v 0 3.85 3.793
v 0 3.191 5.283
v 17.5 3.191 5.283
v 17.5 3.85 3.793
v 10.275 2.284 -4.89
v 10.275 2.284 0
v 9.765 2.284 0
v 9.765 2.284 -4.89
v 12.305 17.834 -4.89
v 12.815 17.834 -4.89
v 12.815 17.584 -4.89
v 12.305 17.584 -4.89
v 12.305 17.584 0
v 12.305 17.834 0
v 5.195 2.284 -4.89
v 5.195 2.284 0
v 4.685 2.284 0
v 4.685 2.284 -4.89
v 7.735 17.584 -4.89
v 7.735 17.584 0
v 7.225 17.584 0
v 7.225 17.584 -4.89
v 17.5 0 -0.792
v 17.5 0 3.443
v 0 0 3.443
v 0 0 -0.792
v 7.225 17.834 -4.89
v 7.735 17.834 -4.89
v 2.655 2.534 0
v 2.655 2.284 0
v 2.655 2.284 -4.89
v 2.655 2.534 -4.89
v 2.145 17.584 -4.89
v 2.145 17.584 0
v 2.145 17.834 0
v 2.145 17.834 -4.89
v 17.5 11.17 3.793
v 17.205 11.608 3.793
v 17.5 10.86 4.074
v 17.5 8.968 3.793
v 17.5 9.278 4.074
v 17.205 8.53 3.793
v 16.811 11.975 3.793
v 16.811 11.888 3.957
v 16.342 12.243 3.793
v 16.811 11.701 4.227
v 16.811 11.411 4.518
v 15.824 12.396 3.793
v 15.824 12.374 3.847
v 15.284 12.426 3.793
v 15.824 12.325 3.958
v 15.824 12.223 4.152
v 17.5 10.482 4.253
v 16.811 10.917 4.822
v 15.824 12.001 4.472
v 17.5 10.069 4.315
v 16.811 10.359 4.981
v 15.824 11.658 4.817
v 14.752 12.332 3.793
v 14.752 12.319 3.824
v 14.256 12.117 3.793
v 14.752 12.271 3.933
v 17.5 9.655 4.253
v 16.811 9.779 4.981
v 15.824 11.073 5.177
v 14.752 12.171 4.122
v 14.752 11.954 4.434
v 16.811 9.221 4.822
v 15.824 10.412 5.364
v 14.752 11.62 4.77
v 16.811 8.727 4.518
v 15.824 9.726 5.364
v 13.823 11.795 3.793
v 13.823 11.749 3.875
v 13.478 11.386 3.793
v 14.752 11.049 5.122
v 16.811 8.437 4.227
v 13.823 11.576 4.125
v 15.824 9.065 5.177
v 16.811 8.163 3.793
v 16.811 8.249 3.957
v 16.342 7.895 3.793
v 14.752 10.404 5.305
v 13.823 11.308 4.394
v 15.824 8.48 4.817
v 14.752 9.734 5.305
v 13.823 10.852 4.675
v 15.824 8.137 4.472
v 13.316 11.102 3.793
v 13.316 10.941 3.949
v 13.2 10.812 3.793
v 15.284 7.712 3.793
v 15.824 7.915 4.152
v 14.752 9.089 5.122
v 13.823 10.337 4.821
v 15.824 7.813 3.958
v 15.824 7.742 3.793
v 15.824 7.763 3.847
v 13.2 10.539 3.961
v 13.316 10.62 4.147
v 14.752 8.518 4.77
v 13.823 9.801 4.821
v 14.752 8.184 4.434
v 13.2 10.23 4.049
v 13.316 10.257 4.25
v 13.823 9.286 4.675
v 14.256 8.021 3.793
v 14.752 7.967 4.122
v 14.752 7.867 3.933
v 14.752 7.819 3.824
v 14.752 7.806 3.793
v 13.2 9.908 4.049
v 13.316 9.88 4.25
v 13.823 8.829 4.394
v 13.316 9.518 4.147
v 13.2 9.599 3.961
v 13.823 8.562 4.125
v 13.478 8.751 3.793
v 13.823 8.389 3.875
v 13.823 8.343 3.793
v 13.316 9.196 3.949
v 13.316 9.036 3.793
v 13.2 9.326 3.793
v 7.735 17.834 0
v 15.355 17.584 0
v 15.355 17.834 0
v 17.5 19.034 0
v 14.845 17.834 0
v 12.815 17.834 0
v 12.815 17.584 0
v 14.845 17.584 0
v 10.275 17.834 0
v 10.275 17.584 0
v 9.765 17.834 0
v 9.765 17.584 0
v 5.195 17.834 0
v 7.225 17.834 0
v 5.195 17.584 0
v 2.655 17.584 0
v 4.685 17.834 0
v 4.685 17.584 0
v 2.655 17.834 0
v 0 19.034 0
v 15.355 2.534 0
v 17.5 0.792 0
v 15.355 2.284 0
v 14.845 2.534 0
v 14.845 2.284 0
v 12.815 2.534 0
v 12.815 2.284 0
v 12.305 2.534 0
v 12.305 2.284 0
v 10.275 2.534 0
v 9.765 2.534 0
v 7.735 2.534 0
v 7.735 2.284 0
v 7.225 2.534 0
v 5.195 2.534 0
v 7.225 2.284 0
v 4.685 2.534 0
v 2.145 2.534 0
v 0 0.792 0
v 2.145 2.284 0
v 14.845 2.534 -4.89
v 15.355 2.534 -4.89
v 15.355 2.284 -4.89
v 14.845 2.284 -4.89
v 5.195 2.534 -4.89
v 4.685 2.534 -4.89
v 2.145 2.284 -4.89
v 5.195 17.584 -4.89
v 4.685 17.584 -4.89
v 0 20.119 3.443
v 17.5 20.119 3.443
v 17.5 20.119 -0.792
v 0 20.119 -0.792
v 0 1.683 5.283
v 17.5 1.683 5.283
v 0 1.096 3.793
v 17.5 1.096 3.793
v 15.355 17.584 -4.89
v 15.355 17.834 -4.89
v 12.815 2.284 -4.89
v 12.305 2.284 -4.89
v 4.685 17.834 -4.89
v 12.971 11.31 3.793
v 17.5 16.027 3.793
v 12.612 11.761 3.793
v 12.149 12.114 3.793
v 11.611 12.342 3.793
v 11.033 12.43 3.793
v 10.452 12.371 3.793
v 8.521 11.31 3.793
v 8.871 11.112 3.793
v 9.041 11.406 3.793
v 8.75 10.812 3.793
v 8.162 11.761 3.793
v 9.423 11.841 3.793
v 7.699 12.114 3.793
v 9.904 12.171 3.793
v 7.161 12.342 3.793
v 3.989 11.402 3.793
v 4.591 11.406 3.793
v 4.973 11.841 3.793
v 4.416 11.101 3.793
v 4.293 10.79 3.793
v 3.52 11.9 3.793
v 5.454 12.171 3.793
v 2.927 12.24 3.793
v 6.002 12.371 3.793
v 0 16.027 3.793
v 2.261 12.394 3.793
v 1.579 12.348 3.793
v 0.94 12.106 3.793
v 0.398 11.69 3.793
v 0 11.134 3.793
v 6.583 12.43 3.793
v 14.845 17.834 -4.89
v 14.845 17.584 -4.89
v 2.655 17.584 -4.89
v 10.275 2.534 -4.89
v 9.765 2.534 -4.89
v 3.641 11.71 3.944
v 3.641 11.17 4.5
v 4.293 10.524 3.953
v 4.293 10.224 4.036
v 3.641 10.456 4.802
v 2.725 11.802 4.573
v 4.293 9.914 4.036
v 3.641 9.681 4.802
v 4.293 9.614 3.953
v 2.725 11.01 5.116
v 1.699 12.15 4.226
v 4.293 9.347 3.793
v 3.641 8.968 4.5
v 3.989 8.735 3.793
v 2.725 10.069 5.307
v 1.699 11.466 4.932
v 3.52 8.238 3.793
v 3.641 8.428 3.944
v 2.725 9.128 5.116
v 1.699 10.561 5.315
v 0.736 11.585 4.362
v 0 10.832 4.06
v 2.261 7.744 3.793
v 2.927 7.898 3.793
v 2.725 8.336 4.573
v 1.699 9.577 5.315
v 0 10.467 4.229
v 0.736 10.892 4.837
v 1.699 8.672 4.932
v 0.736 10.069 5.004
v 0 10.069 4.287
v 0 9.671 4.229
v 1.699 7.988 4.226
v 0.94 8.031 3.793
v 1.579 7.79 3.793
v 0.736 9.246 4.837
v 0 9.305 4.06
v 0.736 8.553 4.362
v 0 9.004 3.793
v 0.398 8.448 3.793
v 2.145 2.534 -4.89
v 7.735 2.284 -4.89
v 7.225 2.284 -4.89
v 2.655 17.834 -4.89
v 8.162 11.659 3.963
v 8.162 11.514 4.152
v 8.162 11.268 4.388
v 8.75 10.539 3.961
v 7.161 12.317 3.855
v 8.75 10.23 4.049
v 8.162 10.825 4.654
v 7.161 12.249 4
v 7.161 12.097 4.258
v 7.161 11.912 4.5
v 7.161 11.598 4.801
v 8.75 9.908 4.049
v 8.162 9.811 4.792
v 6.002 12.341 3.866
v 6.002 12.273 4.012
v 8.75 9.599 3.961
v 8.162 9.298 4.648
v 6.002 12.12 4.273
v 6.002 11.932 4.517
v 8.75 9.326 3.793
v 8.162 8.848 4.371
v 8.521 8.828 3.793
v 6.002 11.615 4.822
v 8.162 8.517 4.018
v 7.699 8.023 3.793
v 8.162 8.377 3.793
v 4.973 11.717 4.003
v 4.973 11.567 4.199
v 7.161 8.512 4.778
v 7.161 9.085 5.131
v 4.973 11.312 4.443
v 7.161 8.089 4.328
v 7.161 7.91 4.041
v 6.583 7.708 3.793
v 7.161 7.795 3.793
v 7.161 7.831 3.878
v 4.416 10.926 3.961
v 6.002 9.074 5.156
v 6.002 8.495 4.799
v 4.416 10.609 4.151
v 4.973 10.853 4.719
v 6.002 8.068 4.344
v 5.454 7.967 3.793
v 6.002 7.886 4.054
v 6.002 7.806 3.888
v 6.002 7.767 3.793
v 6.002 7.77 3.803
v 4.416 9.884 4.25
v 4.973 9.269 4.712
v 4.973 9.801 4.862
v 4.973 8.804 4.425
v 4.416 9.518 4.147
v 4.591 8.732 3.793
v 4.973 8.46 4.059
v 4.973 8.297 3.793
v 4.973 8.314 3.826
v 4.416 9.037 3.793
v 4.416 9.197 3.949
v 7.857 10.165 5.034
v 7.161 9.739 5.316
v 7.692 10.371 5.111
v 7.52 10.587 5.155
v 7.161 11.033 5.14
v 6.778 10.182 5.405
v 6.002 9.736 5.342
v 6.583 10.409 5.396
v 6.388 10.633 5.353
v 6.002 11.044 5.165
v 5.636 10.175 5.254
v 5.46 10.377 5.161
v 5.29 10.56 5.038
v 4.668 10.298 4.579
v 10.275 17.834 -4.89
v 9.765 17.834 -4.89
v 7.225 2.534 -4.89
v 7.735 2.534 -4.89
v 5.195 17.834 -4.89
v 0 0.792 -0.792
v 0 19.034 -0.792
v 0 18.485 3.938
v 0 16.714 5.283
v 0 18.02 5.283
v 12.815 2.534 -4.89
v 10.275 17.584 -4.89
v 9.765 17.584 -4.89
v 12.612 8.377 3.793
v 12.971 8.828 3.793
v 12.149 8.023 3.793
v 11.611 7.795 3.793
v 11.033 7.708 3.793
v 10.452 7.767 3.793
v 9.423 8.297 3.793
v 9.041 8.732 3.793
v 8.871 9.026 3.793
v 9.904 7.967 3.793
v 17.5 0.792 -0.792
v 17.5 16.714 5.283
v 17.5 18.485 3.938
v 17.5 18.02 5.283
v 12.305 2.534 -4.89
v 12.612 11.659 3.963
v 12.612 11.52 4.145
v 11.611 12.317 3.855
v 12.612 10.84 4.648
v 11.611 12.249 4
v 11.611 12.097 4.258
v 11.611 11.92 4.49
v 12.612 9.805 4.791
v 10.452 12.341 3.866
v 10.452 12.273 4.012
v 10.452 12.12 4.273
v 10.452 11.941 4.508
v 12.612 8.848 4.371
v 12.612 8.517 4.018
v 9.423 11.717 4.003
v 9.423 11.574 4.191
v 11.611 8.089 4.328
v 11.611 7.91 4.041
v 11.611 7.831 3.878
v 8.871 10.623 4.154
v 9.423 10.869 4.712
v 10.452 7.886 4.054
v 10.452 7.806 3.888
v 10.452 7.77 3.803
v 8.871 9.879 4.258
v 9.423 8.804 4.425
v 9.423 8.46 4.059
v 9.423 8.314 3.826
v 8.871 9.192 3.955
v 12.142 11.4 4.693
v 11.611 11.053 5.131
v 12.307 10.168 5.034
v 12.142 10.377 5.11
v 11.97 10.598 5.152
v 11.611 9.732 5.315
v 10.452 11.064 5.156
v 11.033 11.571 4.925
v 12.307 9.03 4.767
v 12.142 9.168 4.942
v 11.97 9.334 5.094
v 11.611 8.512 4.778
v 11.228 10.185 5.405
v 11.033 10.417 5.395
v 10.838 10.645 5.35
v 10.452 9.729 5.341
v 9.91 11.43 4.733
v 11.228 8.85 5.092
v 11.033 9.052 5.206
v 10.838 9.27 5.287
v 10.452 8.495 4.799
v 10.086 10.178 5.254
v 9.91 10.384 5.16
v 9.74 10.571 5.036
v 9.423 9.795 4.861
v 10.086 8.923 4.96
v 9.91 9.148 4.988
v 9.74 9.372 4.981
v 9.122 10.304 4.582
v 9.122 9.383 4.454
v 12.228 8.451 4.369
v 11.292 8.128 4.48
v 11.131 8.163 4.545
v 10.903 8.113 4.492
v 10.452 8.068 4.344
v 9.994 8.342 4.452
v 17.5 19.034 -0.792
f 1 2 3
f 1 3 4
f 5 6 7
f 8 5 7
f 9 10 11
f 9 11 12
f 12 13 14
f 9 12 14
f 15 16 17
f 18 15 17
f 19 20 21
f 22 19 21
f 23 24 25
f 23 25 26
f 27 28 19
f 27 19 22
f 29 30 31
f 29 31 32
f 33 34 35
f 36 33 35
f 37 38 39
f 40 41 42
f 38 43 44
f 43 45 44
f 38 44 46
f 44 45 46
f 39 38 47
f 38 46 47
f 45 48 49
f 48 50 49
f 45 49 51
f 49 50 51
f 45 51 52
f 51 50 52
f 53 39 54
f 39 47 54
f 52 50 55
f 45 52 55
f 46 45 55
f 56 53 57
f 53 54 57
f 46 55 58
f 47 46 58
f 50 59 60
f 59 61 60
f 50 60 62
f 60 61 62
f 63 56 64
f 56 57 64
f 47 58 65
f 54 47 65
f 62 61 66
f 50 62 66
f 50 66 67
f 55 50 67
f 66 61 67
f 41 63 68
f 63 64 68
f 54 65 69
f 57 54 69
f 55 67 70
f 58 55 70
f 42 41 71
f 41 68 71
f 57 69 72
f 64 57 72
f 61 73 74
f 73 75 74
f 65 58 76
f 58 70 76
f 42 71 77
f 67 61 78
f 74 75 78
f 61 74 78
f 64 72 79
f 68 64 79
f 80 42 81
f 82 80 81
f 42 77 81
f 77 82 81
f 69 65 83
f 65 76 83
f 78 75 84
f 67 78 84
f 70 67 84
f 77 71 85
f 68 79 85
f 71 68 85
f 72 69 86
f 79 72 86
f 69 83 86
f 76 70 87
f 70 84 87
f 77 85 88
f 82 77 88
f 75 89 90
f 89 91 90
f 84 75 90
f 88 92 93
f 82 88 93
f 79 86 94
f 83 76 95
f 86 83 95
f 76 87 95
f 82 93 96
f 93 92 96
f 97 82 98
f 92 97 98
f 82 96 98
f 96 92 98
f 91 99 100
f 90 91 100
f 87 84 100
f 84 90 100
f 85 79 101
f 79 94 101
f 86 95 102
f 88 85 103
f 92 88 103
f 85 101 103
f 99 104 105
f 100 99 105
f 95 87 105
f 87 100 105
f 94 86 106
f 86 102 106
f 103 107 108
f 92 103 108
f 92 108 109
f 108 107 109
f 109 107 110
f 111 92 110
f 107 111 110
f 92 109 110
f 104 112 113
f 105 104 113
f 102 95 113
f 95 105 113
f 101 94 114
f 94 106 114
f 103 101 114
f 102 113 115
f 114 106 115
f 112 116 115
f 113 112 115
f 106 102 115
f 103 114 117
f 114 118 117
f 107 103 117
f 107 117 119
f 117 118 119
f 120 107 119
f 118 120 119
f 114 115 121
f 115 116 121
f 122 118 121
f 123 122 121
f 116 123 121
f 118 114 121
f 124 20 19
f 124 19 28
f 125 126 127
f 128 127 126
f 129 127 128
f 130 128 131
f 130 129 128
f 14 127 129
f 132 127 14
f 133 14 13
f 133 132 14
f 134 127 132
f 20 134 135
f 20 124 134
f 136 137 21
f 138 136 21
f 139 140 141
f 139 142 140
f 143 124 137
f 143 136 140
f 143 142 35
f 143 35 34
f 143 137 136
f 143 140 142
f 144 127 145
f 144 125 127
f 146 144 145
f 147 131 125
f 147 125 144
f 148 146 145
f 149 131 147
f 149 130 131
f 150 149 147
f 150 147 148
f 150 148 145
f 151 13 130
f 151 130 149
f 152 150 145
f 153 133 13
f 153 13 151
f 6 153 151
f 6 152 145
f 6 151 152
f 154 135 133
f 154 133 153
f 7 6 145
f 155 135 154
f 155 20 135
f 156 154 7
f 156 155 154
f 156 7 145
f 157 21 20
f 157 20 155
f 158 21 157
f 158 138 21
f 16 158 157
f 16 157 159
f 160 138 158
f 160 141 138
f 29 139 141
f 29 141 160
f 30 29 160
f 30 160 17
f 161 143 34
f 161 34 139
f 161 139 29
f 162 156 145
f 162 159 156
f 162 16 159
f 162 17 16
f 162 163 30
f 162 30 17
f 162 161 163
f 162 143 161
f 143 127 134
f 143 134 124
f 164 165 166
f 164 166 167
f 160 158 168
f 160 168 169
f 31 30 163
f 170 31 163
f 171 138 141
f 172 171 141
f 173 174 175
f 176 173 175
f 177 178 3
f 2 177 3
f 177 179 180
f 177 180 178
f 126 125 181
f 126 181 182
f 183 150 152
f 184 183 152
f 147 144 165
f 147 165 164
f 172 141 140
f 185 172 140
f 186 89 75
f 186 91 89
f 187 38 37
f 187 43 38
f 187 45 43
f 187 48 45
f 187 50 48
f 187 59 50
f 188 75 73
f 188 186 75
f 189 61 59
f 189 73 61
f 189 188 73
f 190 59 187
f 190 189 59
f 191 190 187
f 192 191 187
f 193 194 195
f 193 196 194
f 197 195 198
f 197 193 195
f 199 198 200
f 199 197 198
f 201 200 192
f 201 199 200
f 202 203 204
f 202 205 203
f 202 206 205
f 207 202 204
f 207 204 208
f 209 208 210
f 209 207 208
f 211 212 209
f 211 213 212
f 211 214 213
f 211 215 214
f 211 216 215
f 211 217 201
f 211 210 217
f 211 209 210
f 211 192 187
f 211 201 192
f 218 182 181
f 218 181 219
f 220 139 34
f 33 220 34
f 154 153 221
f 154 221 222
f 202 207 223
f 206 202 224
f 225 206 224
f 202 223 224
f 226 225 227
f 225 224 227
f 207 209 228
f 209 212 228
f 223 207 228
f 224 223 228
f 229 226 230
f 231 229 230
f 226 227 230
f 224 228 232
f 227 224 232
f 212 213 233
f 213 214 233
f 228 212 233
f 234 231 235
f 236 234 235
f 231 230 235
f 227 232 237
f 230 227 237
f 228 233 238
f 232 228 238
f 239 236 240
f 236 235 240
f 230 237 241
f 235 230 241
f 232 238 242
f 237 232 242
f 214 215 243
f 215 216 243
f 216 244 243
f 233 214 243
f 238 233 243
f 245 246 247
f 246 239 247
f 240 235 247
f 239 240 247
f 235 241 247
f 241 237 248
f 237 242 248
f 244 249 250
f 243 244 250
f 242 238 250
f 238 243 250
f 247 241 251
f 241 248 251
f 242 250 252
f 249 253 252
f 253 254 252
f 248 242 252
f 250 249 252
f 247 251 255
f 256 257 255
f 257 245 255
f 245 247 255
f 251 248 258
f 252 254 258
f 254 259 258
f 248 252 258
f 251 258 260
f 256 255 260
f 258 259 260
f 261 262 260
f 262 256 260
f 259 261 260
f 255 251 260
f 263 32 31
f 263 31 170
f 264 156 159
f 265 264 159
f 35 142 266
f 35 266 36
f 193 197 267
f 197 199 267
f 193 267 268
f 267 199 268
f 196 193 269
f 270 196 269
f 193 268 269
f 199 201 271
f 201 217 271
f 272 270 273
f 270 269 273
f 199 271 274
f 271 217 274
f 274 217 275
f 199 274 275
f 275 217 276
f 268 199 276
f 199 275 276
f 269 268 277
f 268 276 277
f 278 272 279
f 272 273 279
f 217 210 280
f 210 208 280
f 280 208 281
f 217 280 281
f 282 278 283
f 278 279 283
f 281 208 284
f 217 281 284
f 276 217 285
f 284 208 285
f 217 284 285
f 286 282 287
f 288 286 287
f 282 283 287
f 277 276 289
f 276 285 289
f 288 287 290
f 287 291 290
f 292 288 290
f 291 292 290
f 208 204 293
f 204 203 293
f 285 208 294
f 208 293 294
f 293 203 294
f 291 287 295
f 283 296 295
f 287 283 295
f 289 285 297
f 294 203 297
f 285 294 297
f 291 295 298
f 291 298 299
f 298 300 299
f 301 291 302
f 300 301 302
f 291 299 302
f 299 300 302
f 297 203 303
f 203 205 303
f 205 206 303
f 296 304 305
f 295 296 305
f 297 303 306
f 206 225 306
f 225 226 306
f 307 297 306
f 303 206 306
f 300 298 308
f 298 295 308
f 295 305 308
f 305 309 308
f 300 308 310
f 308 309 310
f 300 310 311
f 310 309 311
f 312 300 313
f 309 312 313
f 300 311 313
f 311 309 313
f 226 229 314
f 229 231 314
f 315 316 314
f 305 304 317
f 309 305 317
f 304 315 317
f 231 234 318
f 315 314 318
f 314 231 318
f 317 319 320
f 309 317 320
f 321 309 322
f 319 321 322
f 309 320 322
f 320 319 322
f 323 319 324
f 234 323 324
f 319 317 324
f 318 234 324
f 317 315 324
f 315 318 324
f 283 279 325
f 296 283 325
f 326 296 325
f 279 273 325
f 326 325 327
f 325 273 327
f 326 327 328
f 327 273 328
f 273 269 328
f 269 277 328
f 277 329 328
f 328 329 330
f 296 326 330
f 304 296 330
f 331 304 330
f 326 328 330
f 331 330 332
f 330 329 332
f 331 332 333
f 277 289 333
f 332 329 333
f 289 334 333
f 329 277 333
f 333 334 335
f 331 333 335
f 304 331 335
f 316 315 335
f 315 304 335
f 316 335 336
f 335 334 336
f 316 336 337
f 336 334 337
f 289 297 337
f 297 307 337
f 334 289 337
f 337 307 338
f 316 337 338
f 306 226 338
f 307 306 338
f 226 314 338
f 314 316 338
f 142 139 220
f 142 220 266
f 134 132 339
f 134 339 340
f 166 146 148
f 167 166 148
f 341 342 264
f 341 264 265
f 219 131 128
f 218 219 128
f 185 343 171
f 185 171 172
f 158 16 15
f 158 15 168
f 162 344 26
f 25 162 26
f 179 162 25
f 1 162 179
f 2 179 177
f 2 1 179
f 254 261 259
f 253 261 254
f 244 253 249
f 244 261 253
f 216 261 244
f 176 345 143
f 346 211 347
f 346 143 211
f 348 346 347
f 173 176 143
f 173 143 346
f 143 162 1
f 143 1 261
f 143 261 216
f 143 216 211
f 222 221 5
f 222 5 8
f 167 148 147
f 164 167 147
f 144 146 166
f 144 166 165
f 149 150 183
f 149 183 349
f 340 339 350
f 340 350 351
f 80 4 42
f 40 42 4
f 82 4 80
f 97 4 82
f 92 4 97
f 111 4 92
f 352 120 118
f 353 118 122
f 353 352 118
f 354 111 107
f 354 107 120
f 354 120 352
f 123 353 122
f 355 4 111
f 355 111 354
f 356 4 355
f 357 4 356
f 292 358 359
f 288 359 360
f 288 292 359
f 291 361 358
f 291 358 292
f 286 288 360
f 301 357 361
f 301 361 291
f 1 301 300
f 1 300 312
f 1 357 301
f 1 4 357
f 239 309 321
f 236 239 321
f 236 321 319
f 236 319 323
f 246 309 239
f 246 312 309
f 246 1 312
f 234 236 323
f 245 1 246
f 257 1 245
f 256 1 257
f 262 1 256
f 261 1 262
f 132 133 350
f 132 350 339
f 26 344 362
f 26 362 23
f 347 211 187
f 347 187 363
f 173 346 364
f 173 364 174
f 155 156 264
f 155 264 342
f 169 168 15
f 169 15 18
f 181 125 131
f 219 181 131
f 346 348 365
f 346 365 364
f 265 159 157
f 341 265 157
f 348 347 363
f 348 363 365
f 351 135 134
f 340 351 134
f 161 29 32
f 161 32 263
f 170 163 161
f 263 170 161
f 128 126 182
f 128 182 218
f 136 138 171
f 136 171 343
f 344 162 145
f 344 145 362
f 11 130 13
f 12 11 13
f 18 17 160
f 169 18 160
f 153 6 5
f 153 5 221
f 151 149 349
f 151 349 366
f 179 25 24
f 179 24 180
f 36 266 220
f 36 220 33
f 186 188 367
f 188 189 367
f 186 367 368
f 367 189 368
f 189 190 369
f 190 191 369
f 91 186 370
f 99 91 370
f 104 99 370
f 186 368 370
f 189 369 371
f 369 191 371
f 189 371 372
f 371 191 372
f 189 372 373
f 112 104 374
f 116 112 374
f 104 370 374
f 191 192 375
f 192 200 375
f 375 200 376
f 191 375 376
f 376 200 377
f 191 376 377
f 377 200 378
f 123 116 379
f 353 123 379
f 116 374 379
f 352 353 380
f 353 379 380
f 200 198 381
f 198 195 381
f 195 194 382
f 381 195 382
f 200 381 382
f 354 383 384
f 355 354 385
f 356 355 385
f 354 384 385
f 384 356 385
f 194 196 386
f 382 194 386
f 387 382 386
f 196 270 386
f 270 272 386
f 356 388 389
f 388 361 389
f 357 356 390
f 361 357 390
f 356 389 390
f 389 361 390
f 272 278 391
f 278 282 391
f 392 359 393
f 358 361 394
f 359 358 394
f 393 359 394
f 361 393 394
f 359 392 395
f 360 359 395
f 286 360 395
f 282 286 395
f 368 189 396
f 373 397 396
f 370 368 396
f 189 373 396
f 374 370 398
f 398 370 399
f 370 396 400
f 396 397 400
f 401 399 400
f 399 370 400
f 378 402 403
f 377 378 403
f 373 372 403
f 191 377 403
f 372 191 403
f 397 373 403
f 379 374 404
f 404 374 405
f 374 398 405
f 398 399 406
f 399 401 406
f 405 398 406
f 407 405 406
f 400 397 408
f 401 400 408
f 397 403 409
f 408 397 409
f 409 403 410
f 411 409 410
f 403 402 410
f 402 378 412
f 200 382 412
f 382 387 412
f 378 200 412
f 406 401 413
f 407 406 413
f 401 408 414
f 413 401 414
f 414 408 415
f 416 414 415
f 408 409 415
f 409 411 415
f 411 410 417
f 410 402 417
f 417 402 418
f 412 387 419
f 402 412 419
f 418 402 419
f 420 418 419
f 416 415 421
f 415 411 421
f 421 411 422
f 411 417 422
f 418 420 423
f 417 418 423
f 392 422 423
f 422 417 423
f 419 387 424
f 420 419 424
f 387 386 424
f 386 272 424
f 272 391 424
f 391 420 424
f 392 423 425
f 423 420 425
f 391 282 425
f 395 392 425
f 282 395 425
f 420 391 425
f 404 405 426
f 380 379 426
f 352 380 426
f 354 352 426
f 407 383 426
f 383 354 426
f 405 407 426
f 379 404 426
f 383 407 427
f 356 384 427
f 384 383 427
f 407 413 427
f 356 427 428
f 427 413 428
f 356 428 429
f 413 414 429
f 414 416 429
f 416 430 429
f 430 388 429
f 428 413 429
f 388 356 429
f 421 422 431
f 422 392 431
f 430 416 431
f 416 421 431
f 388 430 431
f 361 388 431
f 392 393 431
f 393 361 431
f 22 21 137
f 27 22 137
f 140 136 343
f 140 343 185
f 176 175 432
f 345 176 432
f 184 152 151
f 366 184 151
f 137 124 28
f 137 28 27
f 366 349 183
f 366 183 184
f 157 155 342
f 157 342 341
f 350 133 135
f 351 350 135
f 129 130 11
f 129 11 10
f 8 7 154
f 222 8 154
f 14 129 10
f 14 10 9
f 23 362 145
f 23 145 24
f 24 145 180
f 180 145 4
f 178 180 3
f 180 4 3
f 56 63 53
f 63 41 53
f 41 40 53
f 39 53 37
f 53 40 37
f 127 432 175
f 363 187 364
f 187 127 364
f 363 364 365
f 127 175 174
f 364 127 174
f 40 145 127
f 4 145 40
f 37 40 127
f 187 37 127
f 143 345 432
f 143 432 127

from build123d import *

# Parameters (mm, degrees)
EXTRUDE_1_DEPTH = 17.5
SKETCH_6_W      = 0.51
SKETCH_6_H      = 0.25
EXTRUDE_2_DEPTH = 4.89


with BuildPart() as part:
    # 草图2 → 凸台-拉伸1 (new body)
    with BuildSketch(Plane(origin=(0, 0, 0), x_dir=(0, 0, -1), z_dir=(1, 0, 0))):
        Polygon((-3.442512479, 20.118929979), (0.792082517, 20.118929979), (0.792082517, 19.034466272), (0, 19.034466272), (0, 0.792082517), (0.792082517, 0.792082517), (0.792082517, 0), (0, 0), (-3.442512479, 0), (-3.79285667, 1.095795152), (-5.283117125, 1.682856003), (-5.283117125, 3.191302286), (-3.79285667, 3.850153416), (-3.79285667, 16.026820243), (-5.283117125, 16.71396292), (-5.283117125, 18.019534007), (-3.937694697, 18.484803601), align=None)
    extrude(amount=EXTRUDE_1_DEPTH)

    # 草图5 → 旋转8 (revolve)
    with BuildSketch(Plane.XY.offset(2.89285667)):
        with BuildLine():
            Line((0, 10.068929979), (17.5, 10.068929979))
            Line((17.5, 10.068929979), (17.5, 11.490689909))
            ThreePointArc((17.5, 11.490689909), (15.277289221, 12.591913923), (13.2, 11.236182744))
            ThreePointArc((13.2, 11.236182744), (10.975, 12.596281432), (8.75, 11.236182744))
            ThreePointArc((8.75, 11.236182744), (6.517271028, 12.596269485), (4.292994354, 11.222403449))
            ThreePointArc((4.292994354, 11.222403449), (2.215086636, 12.56500204), (0, 11.463338455))
            Line((0, 11.463338455), (0, 10.068929979))
        make_face()
    revolve(axis=Axis((0, 10.068929979, 2.89285667), (1, 0, 0)))

    # 草图6 → 凸台-拉伸2 (add)
    with BuildSketch(Plane(origin=(0, 0, 0), x_dir=(-1, 0, 0), z_dir=(0, 0, -1))):
        with Locations((-12.56, 17.709464989)):
            Rectangle(SKETCH_6_W, SKETCH_6_H)
        with Locations((-15.1, 17.709464989)):
            Rectangle(SKETCH_6_W, SKETCH_6_H)
        with Locations((-10.02, 17.709464989)):
            Rectangle(SKETCH_6_W, SKETCH_6_H)
        with Locations((-7.48, 17.709464989)):
            Rectangle(SKETCH_6_W, SKETCH_6_H)
        with Locations((-4.94, 17.709464989)):
            Rectangle(SKETCH_6_W, SKETCH_6_H)
        with Locations((-2.4, 17.709464989)):
            Rectangle(SKETCH_6_W, SKETCH_6_H)
        with Locations((-15.1, 2.409464989)):
            Rectangle(SKETCH_6_W, SKETCH_6_H)
        with Locations((-12.56, 2.409464989)):
            Rectangle(SKETCH_6_W, SKETCH_6_H)
        with Locations((-10.02, 2.409464989)):
            Rectangle(SKETCH_6_W, SKETCH_6_H)
        with Locations((-7.48, 2.409464989)):
            Rectangle(SKETCH_6_W, SKETCH_6_H)
        with Locations((-4.94, 2.409464989)):
            Rectangle(SKETCH_6_W, SKETCH_6_H)
        with Locations((-2.4, 2.409464989)):
            Rectangle(SKETCH_6_W, SKETCH_6_H)
    extrude(amount=EXTRUDE_2_DEPTH)


solid = part.part
